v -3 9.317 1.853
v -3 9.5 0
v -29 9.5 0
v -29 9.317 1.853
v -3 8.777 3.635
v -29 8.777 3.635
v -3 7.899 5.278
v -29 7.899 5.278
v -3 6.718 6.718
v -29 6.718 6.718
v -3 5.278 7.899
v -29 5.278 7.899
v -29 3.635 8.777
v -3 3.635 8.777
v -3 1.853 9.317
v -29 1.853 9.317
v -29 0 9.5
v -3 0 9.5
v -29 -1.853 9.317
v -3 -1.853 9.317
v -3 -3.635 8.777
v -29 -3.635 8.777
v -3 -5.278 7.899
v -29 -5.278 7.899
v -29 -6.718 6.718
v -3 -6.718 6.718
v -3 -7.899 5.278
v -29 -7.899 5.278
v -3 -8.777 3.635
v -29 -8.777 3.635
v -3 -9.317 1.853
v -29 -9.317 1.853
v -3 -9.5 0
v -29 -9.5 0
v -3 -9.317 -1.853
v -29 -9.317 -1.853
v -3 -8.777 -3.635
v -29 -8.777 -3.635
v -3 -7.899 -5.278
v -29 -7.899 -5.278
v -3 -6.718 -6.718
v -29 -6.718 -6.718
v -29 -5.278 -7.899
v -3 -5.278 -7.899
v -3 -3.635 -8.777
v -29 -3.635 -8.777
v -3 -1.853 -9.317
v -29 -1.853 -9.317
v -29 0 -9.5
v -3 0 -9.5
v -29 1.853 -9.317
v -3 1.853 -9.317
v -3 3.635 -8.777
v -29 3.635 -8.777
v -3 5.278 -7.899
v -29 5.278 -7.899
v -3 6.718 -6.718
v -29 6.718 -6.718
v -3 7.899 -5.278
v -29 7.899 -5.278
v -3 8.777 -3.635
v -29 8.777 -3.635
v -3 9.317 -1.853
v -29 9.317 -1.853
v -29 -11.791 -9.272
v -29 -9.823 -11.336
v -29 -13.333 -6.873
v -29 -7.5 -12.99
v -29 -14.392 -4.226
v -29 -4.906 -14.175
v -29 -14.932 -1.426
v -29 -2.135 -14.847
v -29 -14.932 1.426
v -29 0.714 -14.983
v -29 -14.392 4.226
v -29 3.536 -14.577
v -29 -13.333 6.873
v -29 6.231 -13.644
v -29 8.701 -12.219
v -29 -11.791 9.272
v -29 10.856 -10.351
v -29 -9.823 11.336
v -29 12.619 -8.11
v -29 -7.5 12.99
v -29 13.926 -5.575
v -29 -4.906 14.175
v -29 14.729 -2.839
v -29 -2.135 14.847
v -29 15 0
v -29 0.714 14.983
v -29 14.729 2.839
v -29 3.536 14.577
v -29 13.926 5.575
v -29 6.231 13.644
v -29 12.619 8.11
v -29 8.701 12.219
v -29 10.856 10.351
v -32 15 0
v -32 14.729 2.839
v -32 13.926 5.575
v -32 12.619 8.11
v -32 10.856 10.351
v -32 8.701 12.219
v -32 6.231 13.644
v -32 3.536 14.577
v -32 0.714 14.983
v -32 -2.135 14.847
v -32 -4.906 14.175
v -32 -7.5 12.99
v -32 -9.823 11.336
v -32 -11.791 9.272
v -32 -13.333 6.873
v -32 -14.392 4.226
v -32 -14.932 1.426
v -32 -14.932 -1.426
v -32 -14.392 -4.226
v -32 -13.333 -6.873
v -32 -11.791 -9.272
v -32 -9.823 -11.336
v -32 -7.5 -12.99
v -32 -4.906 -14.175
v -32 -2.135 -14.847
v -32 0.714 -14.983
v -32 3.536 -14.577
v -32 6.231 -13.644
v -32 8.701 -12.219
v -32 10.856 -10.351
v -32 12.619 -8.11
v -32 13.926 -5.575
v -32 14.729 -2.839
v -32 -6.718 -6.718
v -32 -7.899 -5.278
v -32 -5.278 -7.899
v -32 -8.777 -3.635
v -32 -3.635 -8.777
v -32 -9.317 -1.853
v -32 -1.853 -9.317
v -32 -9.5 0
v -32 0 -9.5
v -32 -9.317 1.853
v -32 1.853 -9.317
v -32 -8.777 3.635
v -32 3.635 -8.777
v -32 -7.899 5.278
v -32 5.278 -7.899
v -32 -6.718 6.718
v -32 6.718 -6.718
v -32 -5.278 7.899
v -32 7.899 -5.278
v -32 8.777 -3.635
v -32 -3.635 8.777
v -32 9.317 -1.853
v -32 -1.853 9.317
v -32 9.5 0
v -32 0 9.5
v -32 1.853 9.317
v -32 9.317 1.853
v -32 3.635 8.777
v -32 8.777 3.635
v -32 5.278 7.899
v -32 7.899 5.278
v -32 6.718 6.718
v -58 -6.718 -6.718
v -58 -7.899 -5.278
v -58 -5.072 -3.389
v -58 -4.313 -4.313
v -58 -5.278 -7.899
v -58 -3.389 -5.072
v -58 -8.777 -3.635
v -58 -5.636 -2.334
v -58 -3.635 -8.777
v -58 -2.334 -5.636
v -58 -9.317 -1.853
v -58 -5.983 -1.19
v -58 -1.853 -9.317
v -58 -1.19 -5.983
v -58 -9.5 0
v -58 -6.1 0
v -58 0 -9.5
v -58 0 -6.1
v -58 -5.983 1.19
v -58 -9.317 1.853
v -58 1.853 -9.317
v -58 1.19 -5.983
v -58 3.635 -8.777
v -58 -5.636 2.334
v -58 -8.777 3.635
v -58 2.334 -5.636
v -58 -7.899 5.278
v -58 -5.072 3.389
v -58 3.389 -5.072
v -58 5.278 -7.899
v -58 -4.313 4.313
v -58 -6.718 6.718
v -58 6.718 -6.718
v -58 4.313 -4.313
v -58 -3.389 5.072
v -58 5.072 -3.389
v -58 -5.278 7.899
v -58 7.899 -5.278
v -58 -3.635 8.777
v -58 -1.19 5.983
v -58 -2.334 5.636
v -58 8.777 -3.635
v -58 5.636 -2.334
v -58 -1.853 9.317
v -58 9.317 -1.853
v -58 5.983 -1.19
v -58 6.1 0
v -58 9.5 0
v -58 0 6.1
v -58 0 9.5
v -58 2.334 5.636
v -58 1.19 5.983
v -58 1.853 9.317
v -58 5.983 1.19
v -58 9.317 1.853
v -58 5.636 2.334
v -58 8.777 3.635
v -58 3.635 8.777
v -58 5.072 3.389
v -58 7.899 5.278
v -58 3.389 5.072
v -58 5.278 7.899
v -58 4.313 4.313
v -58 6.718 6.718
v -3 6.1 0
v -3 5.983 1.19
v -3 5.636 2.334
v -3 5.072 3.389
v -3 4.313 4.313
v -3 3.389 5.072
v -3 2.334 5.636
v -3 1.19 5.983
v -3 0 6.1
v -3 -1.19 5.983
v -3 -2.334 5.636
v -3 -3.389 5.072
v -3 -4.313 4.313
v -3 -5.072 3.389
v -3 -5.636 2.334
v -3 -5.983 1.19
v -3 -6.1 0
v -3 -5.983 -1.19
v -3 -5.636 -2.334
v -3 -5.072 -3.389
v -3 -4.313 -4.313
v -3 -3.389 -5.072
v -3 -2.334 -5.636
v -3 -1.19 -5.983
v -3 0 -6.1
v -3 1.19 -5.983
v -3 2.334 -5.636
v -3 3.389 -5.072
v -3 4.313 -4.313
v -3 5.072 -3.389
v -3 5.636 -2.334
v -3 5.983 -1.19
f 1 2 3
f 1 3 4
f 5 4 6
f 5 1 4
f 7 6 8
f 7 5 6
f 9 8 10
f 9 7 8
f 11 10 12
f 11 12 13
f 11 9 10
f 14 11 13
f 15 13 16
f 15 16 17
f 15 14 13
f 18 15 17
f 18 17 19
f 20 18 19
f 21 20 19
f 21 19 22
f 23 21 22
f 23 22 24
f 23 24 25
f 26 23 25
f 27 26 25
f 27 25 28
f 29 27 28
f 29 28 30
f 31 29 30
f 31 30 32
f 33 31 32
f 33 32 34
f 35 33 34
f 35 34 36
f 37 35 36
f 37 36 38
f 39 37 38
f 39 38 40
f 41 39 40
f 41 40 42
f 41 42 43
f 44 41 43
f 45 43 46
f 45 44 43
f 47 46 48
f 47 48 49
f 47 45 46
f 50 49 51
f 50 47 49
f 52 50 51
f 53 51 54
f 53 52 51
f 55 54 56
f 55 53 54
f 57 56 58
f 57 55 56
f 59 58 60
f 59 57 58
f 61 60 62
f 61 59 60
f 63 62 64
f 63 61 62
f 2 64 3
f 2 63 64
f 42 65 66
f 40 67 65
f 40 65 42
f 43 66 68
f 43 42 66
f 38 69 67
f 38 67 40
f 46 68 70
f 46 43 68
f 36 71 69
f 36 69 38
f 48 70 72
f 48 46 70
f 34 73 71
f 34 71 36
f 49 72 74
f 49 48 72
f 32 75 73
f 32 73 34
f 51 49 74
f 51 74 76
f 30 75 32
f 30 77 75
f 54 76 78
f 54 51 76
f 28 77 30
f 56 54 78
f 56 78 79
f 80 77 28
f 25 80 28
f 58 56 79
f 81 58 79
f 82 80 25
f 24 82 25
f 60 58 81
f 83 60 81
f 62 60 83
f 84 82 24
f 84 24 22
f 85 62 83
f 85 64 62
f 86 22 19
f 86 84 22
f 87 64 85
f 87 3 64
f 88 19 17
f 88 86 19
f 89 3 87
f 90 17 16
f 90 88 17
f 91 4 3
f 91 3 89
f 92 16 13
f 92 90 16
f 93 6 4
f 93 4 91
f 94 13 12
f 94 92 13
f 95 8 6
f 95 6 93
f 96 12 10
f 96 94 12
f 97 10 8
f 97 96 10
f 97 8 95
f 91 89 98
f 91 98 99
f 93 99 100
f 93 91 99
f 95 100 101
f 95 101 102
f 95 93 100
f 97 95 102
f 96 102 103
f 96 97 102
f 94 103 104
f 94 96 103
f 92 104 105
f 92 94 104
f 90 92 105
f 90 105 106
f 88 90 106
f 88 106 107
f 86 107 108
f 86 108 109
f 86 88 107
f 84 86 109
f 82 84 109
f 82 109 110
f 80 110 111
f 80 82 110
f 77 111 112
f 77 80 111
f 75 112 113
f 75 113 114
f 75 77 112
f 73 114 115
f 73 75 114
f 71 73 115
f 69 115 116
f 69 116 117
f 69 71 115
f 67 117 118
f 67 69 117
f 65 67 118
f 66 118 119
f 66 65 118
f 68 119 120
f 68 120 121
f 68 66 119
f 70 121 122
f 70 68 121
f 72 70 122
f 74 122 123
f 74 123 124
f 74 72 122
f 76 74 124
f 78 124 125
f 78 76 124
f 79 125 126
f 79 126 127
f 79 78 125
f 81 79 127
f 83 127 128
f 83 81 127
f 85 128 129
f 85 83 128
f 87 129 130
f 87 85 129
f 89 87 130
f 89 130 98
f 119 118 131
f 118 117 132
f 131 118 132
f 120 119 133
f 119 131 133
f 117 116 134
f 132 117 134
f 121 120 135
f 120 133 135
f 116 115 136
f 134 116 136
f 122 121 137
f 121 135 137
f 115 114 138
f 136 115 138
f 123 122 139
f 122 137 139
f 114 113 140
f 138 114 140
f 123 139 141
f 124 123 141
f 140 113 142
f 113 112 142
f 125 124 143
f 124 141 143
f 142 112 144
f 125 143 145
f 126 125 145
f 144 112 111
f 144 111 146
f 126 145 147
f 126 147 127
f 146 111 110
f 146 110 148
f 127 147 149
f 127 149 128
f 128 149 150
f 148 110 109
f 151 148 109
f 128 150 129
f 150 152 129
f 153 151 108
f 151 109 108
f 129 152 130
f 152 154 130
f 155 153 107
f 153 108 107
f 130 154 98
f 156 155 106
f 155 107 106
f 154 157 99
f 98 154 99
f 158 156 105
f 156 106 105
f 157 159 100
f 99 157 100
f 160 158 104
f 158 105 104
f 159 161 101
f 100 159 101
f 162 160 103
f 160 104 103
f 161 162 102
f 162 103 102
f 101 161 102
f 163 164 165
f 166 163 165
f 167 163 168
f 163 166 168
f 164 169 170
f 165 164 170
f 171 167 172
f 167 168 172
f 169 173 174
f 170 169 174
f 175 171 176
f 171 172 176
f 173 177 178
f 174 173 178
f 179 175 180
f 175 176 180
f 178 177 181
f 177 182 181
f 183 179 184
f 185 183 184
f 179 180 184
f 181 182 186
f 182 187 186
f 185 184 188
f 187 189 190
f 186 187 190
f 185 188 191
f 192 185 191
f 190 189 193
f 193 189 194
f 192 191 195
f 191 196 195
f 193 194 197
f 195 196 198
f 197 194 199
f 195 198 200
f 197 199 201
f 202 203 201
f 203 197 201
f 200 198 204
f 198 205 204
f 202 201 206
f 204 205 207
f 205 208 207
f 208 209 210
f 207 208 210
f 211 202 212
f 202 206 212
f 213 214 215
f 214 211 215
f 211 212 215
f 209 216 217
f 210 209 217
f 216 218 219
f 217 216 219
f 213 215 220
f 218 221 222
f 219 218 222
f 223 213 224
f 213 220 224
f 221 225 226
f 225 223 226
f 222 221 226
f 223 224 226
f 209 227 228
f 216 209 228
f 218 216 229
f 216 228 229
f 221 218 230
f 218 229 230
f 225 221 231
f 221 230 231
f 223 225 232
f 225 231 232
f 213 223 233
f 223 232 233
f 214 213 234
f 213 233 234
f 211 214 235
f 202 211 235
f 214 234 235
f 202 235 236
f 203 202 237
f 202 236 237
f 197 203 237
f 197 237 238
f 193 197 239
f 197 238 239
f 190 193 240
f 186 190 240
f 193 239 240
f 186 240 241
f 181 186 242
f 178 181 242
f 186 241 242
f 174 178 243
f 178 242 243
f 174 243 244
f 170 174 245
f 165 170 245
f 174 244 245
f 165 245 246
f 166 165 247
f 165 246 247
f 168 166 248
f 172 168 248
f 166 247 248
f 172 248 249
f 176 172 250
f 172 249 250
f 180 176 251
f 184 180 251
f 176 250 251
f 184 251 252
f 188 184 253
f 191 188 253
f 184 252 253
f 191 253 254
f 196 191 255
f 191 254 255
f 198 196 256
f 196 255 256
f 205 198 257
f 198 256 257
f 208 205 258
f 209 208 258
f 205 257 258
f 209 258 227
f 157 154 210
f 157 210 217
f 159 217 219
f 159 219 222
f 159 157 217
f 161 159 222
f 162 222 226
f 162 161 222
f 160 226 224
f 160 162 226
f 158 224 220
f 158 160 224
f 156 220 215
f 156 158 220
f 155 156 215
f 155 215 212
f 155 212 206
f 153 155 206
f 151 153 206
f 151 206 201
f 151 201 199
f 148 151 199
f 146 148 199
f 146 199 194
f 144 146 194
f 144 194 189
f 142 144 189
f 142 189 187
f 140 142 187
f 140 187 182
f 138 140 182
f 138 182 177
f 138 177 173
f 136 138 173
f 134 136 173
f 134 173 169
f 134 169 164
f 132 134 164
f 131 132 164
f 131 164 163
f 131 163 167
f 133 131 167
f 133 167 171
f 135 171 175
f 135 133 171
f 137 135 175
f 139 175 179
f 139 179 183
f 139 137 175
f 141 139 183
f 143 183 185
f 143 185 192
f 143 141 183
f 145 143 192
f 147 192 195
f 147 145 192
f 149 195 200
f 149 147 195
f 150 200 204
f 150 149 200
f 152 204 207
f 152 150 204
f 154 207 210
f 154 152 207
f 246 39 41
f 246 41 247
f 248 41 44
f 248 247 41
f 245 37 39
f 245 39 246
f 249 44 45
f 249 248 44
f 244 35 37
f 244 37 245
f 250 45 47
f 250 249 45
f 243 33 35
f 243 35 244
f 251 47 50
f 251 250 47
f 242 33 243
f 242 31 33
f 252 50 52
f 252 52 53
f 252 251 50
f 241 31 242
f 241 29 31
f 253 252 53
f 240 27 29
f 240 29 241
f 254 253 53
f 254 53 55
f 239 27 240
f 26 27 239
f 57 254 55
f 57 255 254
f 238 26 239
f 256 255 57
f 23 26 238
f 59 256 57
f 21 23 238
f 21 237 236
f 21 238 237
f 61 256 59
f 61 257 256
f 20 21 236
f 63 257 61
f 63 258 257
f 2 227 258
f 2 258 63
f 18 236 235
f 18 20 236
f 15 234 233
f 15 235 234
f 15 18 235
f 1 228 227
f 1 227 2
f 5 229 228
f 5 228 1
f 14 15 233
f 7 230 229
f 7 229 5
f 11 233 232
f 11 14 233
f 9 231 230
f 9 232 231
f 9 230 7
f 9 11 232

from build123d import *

# Parameters (mm, degrees)
F1_START = -3
F0_R     = 9.5
F0_R_2   = 6.1
F1_DEPTH = 55
F2_START = -29
F0_R_3   = 15
F2_DEPTH = 3


with BuildPart() as f1:
    # F0 (on Right) → F1 (new body)
    with BuildSketch(Plane.YZ.offset(F1_START)):
        Circle(F0_R)
        Circle(F0_R_2, mode=Mode.SUBTRACT)
    extrude(amount=-F1_DEPTH)

    # F0 (on Right) → F2 (join)
    with BuildSketch(Plane.YZ.offset(F2_START)):
        Circle(F0_R_3)
        Circle(F0_R, mode=Mode.SUBTRACT)
    extrude(amount=-F2_DEPTH)


solid = f1.part
